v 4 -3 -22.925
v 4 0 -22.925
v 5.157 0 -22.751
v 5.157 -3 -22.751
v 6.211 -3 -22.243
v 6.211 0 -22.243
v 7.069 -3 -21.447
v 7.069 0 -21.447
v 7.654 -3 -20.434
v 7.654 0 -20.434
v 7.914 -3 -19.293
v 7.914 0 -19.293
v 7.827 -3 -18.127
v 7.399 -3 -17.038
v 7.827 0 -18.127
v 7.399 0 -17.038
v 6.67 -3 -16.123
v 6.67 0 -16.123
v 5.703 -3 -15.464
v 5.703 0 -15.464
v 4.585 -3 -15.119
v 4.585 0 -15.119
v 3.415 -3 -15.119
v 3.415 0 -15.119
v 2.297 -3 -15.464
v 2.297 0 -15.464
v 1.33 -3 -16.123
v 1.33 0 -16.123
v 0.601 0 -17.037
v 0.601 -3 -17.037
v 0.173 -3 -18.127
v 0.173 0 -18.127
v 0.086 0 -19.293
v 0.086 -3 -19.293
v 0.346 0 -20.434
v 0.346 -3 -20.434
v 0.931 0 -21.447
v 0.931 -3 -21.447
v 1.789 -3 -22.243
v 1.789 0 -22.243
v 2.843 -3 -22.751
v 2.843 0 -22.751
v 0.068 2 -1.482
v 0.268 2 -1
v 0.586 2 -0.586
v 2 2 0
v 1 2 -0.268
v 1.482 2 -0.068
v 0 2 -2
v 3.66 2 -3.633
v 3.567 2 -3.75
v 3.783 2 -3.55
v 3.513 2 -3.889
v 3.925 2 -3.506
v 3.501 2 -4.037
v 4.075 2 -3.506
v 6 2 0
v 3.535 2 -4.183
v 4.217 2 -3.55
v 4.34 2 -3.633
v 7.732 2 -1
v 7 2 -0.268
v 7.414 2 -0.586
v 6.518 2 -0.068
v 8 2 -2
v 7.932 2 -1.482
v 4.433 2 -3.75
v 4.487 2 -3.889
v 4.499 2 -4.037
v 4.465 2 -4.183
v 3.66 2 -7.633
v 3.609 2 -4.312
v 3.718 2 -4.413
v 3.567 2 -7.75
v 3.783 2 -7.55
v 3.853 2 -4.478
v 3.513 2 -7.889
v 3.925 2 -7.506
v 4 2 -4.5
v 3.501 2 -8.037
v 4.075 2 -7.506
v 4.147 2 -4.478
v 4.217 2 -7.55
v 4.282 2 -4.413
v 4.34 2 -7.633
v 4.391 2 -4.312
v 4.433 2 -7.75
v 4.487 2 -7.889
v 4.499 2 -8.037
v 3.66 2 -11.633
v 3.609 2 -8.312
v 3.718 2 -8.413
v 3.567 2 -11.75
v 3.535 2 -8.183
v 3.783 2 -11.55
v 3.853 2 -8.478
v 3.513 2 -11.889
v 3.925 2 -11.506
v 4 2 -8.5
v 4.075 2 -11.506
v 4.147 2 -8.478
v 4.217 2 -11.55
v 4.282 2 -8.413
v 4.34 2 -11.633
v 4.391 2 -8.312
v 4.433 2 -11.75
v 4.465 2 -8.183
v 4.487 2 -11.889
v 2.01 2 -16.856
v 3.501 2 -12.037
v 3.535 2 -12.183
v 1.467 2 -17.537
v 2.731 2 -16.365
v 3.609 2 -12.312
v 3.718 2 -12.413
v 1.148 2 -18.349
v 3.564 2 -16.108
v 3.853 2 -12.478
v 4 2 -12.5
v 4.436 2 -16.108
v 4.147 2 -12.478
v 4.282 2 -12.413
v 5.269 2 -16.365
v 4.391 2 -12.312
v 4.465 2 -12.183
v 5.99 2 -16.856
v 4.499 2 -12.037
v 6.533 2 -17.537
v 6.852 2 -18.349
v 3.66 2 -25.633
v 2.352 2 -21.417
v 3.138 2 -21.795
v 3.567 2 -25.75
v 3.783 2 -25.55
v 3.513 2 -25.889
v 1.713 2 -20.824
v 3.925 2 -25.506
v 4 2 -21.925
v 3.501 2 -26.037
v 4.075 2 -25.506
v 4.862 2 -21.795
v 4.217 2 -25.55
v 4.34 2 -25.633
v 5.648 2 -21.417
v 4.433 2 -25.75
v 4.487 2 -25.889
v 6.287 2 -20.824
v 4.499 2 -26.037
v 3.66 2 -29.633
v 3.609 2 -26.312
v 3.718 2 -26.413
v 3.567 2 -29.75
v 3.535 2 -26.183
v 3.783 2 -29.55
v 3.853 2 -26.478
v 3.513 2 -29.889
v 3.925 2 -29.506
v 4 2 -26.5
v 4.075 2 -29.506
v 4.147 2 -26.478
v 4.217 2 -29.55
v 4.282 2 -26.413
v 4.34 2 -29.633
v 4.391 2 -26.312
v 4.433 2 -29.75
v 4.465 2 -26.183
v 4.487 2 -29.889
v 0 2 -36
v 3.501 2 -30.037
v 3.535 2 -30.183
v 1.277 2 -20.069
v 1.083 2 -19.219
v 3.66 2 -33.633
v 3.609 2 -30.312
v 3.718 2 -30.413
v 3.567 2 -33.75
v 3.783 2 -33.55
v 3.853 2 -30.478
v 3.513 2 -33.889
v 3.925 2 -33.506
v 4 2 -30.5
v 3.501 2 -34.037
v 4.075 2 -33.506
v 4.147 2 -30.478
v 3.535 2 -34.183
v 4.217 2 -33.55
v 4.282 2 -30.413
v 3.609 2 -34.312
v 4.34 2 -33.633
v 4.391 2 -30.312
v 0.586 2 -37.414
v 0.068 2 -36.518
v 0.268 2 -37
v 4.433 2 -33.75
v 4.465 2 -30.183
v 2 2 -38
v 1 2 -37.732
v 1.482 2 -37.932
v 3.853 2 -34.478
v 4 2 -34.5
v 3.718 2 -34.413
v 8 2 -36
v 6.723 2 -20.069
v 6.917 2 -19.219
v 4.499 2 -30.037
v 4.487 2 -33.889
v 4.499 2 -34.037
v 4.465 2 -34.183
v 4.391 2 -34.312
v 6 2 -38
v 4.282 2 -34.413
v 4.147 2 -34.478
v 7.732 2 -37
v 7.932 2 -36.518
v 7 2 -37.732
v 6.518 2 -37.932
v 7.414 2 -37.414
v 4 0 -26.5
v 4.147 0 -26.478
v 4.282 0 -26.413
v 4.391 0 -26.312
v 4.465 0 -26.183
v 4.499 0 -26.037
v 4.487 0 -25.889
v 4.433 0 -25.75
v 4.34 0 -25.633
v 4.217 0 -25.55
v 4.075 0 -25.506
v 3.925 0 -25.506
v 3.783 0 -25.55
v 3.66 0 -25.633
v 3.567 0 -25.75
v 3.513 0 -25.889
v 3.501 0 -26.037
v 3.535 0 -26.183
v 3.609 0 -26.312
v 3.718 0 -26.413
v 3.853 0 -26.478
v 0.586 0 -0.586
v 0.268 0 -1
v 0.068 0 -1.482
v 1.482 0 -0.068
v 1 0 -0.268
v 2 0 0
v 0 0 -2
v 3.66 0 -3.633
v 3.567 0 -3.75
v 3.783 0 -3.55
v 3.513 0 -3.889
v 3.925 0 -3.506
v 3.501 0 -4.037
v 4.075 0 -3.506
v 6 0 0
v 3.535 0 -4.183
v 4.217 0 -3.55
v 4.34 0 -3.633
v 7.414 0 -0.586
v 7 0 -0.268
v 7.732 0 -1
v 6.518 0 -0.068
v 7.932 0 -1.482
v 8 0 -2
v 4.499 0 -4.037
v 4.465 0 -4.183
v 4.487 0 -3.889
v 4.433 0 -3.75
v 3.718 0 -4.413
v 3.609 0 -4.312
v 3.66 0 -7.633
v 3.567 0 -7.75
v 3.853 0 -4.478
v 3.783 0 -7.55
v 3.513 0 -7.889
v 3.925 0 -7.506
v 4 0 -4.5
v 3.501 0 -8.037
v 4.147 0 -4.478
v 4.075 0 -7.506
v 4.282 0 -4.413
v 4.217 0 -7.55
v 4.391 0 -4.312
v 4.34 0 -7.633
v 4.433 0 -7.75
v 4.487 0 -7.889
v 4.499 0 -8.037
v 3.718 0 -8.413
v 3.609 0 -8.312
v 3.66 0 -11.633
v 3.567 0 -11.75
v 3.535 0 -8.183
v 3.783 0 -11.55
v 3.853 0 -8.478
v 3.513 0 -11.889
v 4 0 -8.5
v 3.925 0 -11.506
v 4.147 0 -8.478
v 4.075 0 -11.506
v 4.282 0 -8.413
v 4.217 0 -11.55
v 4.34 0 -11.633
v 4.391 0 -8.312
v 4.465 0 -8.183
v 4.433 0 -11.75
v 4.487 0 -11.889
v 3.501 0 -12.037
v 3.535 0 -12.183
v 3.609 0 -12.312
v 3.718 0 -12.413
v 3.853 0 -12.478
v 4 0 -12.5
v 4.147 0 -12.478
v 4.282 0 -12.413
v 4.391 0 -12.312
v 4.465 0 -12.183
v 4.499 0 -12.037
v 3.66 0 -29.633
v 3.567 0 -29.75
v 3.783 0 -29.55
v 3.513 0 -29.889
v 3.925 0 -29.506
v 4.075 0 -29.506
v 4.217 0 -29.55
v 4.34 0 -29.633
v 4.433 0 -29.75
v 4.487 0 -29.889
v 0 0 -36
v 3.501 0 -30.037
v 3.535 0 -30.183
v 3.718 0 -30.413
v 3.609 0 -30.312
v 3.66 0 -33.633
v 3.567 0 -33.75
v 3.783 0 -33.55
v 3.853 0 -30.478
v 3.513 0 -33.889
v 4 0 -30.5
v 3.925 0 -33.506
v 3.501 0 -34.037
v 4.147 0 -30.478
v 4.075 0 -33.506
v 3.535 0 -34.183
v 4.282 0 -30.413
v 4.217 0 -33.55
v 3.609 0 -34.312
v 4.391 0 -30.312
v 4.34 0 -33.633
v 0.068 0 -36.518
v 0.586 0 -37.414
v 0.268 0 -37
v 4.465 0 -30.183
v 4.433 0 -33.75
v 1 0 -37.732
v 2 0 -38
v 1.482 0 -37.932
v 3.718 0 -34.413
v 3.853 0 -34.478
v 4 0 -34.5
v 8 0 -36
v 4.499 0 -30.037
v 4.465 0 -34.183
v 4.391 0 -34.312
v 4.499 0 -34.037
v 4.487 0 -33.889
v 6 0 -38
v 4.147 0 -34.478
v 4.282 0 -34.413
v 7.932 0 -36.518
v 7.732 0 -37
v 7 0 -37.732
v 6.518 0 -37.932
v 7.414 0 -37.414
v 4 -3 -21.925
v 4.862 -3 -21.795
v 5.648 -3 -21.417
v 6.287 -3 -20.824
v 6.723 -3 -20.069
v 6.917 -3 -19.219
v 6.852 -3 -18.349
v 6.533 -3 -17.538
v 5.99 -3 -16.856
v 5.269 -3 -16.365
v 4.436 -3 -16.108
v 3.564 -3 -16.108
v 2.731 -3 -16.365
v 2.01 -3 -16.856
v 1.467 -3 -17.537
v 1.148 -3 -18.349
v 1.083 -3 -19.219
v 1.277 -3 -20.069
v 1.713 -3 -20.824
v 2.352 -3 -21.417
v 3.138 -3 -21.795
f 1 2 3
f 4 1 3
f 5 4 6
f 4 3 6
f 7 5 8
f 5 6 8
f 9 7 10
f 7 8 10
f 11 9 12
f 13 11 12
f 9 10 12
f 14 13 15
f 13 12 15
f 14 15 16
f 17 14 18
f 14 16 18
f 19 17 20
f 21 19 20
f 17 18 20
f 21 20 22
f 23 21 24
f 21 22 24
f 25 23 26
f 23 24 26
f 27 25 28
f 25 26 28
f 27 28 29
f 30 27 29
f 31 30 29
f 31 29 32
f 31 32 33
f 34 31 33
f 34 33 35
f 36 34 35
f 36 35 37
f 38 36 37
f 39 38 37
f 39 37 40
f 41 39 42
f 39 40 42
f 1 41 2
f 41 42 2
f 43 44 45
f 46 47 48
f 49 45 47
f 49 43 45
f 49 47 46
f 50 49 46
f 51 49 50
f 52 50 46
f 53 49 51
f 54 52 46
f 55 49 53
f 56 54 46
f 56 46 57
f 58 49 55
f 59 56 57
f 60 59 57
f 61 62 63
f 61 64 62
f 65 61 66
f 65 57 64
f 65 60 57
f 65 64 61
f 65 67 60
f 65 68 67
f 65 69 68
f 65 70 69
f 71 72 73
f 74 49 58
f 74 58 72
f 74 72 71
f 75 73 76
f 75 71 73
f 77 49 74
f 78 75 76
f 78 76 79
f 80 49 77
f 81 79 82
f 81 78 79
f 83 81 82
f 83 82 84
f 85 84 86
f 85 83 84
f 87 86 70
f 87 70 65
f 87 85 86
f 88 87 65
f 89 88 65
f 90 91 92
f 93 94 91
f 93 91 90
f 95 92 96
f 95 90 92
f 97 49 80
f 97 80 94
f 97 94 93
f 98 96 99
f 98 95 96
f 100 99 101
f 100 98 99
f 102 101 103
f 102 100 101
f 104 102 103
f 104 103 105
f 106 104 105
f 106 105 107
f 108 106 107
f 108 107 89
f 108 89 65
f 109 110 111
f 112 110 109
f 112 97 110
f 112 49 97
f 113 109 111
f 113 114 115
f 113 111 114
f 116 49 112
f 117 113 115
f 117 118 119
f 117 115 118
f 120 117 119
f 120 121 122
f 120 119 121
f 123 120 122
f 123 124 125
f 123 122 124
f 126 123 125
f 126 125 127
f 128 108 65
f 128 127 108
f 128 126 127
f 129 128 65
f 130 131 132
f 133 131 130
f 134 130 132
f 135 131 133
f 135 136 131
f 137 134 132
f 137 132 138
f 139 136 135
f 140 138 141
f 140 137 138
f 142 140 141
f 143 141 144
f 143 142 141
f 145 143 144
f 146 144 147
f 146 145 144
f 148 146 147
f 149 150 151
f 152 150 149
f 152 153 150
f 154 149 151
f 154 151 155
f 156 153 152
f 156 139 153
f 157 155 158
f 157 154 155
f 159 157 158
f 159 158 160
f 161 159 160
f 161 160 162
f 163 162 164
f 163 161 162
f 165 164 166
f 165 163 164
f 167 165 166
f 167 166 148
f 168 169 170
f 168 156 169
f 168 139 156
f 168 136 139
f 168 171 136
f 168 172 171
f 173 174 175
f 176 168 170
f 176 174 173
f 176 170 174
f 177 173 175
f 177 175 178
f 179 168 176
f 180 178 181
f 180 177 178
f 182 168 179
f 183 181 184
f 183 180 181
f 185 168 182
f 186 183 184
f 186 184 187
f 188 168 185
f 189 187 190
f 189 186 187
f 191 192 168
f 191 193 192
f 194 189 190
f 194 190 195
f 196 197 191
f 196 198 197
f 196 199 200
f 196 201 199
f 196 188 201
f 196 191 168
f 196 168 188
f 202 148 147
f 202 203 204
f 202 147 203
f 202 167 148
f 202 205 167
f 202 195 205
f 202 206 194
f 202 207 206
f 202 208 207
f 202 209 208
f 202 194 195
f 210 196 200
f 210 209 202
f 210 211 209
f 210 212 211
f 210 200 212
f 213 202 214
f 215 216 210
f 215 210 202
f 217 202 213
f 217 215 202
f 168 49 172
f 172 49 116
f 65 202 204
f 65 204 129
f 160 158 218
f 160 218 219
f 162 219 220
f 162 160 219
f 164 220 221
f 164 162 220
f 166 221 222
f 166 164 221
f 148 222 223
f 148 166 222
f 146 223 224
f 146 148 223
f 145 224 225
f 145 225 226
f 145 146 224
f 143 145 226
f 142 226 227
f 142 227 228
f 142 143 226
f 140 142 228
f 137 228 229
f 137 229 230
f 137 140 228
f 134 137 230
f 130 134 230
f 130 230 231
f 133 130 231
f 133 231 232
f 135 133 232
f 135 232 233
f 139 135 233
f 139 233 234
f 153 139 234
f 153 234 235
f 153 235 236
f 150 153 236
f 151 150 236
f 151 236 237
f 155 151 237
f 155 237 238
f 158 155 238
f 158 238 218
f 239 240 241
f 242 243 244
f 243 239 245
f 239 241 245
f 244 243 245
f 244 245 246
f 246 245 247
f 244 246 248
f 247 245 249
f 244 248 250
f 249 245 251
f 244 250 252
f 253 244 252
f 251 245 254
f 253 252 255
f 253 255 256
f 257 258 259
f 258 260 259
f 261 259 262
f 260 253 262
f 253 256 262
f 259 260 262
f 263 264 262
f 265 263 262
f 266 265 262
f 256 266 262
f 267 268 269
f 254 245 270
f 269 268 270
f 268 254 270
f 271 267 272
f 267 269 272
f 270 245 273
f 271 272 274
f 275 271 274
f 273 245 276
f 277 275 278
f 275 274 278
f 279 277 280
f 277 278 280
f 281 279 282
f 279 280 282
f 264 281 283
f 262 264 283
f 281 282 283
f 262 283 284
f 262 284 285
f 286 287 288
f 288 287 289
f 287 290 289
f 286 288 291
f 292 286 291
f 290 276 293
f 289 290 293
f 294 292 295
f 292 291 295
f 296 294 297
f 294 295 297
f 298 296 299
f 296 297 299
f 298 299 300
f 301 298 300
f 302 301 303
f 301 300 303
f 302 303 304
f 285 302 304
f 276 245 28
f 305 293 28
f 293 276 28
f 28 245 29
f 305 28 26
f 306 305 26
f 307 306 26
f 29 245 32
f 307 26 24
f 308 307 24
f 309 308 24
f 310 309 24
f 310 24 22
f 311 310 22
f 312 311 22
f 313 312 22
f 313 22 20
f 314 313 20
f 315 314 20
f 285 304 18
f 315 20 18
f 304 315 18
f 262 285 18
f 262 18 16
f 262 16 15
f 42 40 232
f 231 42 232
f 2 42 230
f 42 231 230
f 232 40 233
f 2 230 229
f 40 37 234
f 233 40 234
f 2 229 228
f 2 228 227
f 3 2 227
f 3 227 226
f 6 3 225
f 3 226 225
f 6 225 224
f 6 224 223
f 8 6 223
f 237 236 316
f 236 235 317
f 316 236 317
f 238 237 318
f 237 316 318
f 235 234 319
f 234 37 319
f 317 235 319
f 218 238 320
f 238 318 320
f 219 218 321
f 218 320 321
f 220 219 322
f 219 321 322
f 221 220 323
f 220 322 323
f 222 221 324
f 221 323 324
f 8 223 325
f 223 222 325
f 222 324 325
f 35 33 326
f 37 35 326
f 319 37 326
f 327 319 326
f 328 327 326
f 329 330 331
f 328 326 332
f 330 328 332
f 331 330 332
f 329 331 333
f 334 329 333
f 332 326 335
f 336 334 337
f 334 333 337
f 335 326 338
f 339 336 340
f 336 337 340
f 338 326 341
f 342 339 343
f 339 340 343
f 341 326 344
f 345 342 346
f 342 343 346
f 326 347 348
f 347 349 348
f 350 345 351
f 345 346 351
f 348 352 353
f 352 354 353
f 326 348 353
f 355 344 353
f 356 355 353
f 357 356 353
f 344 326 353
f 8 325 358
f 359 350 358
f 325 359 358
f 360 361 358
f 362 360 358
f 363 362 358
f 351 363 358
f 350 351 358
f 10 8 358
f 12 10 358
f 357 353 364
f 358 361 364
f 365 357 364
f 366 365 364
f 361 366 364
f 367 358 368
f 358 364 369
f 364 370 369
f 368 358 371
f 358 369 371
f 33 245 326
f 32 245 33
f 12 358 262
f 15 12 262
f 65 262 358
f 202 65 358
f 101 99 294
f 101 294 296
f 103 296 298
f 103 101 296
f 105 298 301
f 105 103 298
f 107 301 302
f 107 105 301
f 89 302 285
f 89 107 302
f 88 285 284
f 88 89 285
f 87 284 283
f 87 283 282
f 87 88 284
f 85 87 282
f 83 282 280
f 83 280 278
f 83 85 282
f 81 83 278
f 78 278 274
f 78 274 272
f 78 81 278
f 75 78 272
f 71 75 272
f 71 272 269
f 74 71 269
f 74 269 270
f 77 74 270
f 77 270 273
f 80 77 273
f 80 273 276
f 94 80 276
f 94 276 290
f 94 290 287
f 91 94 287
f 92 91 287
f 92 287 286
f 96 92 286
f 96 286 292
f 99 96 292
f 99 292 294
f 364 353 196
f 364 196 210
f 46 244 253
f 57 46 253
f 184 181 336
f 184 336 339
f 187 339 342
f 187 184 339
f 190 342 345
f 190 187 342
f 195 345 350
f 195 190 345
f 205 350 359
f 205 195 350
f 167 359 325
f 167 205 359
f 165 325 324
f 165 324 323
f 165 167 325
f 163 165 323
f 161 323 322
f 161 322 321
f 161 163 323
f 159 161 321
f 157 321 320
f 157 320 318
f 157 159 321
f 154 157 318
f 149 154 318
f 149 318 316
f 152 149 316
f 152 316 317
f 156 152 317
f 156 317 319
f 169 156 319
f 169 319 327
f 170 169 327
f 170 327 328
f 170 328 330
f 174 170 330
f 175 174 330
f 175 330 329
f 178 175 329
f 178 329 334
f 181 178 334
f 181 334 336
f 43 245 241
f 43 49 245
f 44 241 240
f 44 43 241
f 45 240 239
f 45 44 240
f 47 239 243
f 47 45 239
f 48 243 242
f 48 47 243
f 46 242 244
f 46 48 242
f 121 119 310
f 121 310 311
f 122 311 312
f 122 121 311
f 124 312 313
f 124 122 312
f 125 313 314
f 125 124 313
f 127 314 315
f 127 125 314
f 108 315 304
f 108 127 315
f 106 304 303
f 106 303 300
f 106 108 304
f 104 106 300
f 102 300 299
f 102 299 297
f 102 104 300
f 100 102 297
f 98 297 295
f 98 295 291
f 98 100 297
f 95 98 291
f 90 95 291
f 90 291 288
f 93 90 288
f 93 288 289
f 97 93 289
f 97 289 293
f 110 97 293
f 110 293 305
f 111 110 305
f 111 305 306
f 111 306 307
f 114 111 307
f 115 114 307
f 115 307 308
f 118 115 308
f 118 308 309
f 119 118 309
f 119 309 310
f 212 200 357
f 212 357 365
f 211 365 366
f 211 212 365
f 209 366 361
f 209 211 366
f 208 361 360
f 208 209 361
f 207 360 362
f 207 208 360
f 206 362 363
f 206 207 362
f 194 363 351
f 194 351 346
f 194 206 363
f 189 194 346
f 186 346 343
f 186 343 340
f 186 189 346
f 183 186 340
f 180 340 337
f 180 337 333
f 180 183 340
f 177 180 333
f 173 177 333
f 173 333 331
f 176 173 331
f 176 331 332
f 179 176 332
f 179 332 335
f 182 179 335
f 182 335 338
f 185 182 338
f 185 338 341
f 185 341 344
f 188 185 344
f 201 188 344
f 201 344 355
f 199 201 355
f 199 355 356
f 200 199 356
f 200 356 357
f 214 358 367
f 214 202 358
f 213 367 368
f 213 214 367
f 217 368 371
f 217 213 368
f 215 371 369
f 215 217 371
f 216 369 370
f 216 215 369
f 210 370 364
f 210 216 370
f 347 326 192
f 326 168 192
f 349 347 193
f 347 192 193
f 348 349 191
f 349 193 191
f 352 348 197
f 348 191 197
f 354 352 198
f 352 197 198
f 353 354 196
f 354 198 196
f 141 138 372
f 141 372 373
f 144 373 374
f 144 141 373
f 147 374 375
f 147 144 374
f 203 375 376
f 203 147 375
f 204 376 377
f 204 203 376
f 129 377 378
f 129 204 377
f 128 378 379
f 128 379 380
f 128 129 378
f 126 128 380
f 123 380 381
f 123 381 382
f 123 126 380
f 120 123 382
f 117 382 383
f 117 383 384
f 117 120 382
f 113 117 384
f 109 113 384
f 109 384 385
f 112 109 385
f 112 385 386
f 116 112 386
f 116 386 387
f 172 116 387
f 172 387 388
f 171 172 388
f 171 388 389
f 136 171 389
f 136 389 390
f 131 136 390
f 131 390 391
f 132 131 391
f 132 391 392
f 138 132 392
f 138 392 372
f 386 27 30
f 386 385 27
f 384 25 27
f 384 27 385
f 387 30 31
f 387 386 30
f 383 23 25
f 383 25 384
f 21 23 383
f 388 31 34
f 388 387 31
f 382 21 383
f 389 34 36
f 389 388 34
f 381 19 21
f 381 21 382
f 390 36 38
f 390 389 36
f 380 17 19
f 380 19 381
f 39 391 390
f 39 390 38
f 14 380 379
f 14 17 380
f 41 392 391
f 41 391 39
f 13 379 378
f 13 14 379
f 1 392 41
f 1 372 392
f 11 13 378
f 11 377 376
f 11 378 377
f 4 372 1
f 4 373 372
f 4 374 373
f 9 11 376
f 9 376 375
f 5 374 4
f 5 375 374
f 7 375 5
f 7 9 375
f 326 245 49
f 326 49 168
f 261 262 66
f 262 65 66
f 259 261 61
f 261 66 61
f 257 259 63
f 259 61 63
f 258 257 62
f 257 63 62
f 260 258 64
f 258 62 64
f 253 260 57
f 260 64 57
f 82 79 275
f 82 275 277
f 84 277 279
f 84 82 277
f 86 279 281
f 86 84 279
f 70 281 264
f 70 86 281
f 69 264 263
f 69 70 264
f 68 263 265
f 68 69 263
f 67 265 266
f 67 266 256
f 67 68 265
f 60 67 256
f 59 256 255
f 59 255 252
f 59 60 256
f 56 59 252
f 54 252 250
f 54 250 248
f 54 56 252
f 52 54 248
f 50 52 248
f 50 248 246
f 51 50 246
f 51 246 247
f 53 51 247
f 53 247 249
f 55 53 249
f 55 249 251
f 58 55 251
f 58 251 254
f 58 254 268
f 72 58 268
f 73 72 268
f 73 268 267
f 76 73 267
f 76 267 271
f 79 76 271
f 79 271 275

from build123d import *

# Parameters (mm, degrees)
SKETCH1_W           = 8
SKETCH1_H           = 38
BOSS_EXTRUDE1_DEPTH = 2
SKETCH2_R           = 3.925
SKETCH2_R_2         = 2.925
BOSS_EXTRUDE2_DEPTH = 3
CUT_EXTRUDE1_START  = -3
SKETCH3_R           = 2.925
SKETCH3_R_2         = 0.5
CUT_EXTRUDE1_DEPTH  = 3
FILLET3_R           = 2


with BuildPart() as part:
    # Sketch1 → Boss-Extrude1 (new body)
    with BuildSketch(Plane(origin=(0, 0, 0), x_dir=(1, 0, 0), z_dir=(0, 1, 0))):
        with Locations((4, 19)):
            Rectangle(SKETCH1_W, SKETCH1_H)
    extrude(amount=BOSS_EXTRUDE1_DEPTH)

    # Sketch2 → Boss-Extrude2 (add)
    with BuildSketch(Plane.XZ):
        with Locations(Location((4, -19, 0), (0, 0, 270))):
            Circle(SKETCH2_R)
        with Locations(Location((4, -19, 0), (0, 0, 270))):
            Circle(SKETCH2_R_2, mode=Mode.SUBTRACT)
    extrude(amount=BOSS_EXTRUDE2_DEPTH)

    # Sketch3 → Cut-Extrude1 (cut)
    with BuildSketch(Plane.XZ.offset(CUT_EXTRUDE1_START)):
        with Locations(Location((4, -19, 0), (0, 0, 270))):
            Circle(SKETCH3_R)
        with Locations(Location((4, -4, 0), (0, 0, 270))):
            Circle(SKETCH3_R_2)
        with Locations(Location((4, -8, 0), (0, 0, 270))):
            Circle(SKETCH3_R_2)
        with Locations(Location((4, -12, 0), (0, 0, 270))):
            Circle(SKETCH3_R_2)
        with Locations(Location((4, -26, 0), (0, 0, 270))):
            Circle(SKETCH3_R_2)
        with Locations(Location((4, -30, 0), (0, 0, 270))):
            Circle(SKETCH3_R_2)
        with Locations(Location((4, -34, 0), (0, 0, 270))):
            Circle(SKETCH3_R_2)
    extrude(amount=CUT_EXTRUDE1_DEPTH, mode=Mode.SUBTRACT)

    # Fillet3
    fillet3_edges = [part.edges().sort_by_distance(p)[0] for p in [
        (0, 1, -38),
        (8, 1, -38),
        (8, 1, 0),
        (0, 1, 0),
    ]]
    fillet(fillet3_edges, radius=FILLET3_R)


solid = part.part
